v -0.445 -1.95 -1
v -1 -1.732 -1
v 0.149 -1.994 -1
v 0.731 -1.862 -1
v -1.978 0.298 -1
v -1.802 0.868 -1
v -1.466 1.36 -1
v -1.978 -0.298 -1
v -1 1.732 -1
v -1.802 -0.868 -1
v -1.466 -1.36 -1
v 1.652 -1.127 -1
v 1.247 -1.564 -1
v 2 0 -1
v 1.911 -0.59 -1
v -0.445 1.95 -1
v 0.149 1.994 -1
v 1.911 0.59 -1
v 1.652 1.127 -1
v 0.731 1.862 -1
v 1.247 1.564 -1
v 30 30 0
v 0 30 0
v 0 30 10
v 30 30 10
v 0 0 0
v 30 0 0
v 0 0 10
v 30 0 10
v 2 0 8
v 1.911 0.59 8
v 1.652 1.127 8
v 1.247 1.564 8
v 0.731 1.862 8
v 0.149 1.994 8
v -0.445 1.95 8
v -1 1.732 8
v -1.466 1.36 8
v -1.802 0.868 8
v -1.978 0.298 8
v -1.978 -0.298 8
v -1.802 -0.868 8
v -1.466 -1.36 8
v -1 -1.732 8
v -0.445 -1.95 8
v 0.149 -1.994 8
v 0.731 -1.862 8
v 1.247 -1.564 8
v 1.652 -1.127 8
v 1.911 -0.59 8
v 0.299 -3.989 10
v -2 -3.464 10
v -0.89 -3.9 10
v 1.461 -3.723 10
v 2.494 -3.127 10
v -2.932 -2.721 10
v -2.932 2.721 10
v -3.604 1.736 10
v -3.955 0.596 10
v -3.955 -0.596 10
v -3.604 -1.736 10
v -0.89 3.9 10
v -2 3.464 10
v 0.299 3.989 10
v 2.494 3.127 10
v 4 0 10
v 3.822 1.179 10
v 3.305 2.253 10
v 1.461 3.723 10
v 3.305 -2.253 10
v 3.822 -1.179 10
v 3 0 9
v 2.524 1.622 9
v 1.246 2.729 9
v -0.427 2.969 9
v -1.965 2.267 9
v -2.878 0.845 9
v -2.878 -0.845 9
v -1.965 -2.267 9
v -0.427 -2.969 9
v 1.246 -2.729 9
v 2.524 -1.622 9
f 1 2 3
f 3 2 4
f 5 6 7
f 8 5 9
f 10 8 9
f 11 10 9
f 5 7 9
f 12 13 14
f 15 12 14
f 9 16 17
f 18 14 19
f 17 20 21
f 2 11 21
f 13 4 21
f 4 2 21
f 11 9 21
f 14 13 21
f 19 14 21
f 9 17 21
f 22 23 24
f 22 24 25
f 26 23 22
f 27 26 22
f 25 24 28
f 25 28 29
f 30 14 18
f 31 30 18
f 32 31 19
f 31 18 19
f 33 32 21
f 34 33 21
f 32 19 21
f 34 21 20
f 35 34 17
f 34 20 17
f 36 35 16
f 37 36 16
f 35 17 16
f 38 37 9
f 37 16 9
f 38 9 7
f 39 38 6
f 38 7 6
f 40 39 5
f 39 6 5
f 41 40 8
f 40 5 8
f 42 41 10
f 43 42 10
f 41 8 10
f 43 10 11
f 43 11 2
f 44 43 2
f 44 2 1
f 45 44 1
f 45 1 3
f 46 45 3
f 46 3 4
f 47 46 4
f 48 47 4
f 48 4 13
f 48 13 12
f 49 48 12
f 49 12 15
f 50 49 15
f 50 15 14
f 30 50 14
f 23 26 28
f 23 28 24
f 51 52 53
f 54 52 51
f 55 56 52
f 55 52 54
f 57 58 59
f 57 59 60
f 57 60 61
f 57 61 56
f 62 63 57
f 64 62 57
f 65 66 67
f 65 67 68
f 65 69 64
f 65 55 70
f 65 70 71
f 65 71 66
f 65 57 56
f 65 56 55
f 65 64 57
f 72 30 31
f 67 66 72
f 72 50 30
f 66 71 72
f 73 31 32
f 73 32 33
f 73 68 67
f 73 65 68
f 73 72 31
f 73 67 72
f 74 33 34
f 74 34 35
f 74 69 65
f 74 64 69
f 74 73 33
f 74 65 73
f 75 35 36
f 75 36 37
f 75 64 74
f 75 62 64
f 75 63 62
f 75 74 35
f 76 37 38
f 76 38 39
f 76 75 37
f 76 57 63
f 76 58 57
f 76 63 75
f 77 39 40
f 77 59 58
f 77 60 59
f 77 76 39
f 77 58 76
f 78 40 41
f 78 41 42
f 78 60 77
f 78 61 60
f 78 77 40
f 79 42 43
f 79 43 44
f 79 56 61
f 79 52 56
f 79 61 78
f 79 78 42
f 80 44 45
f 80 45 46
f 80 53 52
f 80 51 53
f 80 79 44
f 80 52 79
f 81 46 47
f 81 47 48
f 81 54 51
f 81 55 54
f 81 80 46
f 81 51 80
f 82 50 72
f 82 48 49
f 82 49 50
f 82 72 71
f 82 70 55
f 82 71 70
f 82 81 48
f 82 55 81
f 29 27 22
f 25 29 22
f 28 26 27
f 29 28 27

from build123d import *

# Parameters (mm, degrees)
BOX_W          = 30
BOX_H          = 30
BOX_DEPTH      = 10
CYLINDER_R     = 2
CYLINDER_DEPTH = 11


with BuildPart() as cube:
    # Box → Box (new body)
    with BuildSketch(Plane.XY):
        with Locations((15, 15)):
            Rectangle(BOX_W, BOX_H)
    extrude(amount=BOX_DEPTH)


with BuildPart() as cone:
    # Cone → Cone (revolve)
    with BuildSketch(Plane(origin=(0, 0, 8), x_dir=(1, 0, 0), z_dir=(0, -1, 0))):
        Polygon((0, 0), (2, 0), (4, 2), (0, 2), align=None)
    revolve(axis=Axis((0, 0, 8), (0, 0, 1)))


with BuildPart() as screw:
    # Cylinder → Cylinder (new body)
    with BuildSketch(Plane.XY.offset(-1)):
        Circle(CYLINDER_R)
    extrude(amount=CYLINDER_DEPTH)

    # Fusion: union Cone
    add(cone.part)


solid = Compound([cube.part, screw.part])
